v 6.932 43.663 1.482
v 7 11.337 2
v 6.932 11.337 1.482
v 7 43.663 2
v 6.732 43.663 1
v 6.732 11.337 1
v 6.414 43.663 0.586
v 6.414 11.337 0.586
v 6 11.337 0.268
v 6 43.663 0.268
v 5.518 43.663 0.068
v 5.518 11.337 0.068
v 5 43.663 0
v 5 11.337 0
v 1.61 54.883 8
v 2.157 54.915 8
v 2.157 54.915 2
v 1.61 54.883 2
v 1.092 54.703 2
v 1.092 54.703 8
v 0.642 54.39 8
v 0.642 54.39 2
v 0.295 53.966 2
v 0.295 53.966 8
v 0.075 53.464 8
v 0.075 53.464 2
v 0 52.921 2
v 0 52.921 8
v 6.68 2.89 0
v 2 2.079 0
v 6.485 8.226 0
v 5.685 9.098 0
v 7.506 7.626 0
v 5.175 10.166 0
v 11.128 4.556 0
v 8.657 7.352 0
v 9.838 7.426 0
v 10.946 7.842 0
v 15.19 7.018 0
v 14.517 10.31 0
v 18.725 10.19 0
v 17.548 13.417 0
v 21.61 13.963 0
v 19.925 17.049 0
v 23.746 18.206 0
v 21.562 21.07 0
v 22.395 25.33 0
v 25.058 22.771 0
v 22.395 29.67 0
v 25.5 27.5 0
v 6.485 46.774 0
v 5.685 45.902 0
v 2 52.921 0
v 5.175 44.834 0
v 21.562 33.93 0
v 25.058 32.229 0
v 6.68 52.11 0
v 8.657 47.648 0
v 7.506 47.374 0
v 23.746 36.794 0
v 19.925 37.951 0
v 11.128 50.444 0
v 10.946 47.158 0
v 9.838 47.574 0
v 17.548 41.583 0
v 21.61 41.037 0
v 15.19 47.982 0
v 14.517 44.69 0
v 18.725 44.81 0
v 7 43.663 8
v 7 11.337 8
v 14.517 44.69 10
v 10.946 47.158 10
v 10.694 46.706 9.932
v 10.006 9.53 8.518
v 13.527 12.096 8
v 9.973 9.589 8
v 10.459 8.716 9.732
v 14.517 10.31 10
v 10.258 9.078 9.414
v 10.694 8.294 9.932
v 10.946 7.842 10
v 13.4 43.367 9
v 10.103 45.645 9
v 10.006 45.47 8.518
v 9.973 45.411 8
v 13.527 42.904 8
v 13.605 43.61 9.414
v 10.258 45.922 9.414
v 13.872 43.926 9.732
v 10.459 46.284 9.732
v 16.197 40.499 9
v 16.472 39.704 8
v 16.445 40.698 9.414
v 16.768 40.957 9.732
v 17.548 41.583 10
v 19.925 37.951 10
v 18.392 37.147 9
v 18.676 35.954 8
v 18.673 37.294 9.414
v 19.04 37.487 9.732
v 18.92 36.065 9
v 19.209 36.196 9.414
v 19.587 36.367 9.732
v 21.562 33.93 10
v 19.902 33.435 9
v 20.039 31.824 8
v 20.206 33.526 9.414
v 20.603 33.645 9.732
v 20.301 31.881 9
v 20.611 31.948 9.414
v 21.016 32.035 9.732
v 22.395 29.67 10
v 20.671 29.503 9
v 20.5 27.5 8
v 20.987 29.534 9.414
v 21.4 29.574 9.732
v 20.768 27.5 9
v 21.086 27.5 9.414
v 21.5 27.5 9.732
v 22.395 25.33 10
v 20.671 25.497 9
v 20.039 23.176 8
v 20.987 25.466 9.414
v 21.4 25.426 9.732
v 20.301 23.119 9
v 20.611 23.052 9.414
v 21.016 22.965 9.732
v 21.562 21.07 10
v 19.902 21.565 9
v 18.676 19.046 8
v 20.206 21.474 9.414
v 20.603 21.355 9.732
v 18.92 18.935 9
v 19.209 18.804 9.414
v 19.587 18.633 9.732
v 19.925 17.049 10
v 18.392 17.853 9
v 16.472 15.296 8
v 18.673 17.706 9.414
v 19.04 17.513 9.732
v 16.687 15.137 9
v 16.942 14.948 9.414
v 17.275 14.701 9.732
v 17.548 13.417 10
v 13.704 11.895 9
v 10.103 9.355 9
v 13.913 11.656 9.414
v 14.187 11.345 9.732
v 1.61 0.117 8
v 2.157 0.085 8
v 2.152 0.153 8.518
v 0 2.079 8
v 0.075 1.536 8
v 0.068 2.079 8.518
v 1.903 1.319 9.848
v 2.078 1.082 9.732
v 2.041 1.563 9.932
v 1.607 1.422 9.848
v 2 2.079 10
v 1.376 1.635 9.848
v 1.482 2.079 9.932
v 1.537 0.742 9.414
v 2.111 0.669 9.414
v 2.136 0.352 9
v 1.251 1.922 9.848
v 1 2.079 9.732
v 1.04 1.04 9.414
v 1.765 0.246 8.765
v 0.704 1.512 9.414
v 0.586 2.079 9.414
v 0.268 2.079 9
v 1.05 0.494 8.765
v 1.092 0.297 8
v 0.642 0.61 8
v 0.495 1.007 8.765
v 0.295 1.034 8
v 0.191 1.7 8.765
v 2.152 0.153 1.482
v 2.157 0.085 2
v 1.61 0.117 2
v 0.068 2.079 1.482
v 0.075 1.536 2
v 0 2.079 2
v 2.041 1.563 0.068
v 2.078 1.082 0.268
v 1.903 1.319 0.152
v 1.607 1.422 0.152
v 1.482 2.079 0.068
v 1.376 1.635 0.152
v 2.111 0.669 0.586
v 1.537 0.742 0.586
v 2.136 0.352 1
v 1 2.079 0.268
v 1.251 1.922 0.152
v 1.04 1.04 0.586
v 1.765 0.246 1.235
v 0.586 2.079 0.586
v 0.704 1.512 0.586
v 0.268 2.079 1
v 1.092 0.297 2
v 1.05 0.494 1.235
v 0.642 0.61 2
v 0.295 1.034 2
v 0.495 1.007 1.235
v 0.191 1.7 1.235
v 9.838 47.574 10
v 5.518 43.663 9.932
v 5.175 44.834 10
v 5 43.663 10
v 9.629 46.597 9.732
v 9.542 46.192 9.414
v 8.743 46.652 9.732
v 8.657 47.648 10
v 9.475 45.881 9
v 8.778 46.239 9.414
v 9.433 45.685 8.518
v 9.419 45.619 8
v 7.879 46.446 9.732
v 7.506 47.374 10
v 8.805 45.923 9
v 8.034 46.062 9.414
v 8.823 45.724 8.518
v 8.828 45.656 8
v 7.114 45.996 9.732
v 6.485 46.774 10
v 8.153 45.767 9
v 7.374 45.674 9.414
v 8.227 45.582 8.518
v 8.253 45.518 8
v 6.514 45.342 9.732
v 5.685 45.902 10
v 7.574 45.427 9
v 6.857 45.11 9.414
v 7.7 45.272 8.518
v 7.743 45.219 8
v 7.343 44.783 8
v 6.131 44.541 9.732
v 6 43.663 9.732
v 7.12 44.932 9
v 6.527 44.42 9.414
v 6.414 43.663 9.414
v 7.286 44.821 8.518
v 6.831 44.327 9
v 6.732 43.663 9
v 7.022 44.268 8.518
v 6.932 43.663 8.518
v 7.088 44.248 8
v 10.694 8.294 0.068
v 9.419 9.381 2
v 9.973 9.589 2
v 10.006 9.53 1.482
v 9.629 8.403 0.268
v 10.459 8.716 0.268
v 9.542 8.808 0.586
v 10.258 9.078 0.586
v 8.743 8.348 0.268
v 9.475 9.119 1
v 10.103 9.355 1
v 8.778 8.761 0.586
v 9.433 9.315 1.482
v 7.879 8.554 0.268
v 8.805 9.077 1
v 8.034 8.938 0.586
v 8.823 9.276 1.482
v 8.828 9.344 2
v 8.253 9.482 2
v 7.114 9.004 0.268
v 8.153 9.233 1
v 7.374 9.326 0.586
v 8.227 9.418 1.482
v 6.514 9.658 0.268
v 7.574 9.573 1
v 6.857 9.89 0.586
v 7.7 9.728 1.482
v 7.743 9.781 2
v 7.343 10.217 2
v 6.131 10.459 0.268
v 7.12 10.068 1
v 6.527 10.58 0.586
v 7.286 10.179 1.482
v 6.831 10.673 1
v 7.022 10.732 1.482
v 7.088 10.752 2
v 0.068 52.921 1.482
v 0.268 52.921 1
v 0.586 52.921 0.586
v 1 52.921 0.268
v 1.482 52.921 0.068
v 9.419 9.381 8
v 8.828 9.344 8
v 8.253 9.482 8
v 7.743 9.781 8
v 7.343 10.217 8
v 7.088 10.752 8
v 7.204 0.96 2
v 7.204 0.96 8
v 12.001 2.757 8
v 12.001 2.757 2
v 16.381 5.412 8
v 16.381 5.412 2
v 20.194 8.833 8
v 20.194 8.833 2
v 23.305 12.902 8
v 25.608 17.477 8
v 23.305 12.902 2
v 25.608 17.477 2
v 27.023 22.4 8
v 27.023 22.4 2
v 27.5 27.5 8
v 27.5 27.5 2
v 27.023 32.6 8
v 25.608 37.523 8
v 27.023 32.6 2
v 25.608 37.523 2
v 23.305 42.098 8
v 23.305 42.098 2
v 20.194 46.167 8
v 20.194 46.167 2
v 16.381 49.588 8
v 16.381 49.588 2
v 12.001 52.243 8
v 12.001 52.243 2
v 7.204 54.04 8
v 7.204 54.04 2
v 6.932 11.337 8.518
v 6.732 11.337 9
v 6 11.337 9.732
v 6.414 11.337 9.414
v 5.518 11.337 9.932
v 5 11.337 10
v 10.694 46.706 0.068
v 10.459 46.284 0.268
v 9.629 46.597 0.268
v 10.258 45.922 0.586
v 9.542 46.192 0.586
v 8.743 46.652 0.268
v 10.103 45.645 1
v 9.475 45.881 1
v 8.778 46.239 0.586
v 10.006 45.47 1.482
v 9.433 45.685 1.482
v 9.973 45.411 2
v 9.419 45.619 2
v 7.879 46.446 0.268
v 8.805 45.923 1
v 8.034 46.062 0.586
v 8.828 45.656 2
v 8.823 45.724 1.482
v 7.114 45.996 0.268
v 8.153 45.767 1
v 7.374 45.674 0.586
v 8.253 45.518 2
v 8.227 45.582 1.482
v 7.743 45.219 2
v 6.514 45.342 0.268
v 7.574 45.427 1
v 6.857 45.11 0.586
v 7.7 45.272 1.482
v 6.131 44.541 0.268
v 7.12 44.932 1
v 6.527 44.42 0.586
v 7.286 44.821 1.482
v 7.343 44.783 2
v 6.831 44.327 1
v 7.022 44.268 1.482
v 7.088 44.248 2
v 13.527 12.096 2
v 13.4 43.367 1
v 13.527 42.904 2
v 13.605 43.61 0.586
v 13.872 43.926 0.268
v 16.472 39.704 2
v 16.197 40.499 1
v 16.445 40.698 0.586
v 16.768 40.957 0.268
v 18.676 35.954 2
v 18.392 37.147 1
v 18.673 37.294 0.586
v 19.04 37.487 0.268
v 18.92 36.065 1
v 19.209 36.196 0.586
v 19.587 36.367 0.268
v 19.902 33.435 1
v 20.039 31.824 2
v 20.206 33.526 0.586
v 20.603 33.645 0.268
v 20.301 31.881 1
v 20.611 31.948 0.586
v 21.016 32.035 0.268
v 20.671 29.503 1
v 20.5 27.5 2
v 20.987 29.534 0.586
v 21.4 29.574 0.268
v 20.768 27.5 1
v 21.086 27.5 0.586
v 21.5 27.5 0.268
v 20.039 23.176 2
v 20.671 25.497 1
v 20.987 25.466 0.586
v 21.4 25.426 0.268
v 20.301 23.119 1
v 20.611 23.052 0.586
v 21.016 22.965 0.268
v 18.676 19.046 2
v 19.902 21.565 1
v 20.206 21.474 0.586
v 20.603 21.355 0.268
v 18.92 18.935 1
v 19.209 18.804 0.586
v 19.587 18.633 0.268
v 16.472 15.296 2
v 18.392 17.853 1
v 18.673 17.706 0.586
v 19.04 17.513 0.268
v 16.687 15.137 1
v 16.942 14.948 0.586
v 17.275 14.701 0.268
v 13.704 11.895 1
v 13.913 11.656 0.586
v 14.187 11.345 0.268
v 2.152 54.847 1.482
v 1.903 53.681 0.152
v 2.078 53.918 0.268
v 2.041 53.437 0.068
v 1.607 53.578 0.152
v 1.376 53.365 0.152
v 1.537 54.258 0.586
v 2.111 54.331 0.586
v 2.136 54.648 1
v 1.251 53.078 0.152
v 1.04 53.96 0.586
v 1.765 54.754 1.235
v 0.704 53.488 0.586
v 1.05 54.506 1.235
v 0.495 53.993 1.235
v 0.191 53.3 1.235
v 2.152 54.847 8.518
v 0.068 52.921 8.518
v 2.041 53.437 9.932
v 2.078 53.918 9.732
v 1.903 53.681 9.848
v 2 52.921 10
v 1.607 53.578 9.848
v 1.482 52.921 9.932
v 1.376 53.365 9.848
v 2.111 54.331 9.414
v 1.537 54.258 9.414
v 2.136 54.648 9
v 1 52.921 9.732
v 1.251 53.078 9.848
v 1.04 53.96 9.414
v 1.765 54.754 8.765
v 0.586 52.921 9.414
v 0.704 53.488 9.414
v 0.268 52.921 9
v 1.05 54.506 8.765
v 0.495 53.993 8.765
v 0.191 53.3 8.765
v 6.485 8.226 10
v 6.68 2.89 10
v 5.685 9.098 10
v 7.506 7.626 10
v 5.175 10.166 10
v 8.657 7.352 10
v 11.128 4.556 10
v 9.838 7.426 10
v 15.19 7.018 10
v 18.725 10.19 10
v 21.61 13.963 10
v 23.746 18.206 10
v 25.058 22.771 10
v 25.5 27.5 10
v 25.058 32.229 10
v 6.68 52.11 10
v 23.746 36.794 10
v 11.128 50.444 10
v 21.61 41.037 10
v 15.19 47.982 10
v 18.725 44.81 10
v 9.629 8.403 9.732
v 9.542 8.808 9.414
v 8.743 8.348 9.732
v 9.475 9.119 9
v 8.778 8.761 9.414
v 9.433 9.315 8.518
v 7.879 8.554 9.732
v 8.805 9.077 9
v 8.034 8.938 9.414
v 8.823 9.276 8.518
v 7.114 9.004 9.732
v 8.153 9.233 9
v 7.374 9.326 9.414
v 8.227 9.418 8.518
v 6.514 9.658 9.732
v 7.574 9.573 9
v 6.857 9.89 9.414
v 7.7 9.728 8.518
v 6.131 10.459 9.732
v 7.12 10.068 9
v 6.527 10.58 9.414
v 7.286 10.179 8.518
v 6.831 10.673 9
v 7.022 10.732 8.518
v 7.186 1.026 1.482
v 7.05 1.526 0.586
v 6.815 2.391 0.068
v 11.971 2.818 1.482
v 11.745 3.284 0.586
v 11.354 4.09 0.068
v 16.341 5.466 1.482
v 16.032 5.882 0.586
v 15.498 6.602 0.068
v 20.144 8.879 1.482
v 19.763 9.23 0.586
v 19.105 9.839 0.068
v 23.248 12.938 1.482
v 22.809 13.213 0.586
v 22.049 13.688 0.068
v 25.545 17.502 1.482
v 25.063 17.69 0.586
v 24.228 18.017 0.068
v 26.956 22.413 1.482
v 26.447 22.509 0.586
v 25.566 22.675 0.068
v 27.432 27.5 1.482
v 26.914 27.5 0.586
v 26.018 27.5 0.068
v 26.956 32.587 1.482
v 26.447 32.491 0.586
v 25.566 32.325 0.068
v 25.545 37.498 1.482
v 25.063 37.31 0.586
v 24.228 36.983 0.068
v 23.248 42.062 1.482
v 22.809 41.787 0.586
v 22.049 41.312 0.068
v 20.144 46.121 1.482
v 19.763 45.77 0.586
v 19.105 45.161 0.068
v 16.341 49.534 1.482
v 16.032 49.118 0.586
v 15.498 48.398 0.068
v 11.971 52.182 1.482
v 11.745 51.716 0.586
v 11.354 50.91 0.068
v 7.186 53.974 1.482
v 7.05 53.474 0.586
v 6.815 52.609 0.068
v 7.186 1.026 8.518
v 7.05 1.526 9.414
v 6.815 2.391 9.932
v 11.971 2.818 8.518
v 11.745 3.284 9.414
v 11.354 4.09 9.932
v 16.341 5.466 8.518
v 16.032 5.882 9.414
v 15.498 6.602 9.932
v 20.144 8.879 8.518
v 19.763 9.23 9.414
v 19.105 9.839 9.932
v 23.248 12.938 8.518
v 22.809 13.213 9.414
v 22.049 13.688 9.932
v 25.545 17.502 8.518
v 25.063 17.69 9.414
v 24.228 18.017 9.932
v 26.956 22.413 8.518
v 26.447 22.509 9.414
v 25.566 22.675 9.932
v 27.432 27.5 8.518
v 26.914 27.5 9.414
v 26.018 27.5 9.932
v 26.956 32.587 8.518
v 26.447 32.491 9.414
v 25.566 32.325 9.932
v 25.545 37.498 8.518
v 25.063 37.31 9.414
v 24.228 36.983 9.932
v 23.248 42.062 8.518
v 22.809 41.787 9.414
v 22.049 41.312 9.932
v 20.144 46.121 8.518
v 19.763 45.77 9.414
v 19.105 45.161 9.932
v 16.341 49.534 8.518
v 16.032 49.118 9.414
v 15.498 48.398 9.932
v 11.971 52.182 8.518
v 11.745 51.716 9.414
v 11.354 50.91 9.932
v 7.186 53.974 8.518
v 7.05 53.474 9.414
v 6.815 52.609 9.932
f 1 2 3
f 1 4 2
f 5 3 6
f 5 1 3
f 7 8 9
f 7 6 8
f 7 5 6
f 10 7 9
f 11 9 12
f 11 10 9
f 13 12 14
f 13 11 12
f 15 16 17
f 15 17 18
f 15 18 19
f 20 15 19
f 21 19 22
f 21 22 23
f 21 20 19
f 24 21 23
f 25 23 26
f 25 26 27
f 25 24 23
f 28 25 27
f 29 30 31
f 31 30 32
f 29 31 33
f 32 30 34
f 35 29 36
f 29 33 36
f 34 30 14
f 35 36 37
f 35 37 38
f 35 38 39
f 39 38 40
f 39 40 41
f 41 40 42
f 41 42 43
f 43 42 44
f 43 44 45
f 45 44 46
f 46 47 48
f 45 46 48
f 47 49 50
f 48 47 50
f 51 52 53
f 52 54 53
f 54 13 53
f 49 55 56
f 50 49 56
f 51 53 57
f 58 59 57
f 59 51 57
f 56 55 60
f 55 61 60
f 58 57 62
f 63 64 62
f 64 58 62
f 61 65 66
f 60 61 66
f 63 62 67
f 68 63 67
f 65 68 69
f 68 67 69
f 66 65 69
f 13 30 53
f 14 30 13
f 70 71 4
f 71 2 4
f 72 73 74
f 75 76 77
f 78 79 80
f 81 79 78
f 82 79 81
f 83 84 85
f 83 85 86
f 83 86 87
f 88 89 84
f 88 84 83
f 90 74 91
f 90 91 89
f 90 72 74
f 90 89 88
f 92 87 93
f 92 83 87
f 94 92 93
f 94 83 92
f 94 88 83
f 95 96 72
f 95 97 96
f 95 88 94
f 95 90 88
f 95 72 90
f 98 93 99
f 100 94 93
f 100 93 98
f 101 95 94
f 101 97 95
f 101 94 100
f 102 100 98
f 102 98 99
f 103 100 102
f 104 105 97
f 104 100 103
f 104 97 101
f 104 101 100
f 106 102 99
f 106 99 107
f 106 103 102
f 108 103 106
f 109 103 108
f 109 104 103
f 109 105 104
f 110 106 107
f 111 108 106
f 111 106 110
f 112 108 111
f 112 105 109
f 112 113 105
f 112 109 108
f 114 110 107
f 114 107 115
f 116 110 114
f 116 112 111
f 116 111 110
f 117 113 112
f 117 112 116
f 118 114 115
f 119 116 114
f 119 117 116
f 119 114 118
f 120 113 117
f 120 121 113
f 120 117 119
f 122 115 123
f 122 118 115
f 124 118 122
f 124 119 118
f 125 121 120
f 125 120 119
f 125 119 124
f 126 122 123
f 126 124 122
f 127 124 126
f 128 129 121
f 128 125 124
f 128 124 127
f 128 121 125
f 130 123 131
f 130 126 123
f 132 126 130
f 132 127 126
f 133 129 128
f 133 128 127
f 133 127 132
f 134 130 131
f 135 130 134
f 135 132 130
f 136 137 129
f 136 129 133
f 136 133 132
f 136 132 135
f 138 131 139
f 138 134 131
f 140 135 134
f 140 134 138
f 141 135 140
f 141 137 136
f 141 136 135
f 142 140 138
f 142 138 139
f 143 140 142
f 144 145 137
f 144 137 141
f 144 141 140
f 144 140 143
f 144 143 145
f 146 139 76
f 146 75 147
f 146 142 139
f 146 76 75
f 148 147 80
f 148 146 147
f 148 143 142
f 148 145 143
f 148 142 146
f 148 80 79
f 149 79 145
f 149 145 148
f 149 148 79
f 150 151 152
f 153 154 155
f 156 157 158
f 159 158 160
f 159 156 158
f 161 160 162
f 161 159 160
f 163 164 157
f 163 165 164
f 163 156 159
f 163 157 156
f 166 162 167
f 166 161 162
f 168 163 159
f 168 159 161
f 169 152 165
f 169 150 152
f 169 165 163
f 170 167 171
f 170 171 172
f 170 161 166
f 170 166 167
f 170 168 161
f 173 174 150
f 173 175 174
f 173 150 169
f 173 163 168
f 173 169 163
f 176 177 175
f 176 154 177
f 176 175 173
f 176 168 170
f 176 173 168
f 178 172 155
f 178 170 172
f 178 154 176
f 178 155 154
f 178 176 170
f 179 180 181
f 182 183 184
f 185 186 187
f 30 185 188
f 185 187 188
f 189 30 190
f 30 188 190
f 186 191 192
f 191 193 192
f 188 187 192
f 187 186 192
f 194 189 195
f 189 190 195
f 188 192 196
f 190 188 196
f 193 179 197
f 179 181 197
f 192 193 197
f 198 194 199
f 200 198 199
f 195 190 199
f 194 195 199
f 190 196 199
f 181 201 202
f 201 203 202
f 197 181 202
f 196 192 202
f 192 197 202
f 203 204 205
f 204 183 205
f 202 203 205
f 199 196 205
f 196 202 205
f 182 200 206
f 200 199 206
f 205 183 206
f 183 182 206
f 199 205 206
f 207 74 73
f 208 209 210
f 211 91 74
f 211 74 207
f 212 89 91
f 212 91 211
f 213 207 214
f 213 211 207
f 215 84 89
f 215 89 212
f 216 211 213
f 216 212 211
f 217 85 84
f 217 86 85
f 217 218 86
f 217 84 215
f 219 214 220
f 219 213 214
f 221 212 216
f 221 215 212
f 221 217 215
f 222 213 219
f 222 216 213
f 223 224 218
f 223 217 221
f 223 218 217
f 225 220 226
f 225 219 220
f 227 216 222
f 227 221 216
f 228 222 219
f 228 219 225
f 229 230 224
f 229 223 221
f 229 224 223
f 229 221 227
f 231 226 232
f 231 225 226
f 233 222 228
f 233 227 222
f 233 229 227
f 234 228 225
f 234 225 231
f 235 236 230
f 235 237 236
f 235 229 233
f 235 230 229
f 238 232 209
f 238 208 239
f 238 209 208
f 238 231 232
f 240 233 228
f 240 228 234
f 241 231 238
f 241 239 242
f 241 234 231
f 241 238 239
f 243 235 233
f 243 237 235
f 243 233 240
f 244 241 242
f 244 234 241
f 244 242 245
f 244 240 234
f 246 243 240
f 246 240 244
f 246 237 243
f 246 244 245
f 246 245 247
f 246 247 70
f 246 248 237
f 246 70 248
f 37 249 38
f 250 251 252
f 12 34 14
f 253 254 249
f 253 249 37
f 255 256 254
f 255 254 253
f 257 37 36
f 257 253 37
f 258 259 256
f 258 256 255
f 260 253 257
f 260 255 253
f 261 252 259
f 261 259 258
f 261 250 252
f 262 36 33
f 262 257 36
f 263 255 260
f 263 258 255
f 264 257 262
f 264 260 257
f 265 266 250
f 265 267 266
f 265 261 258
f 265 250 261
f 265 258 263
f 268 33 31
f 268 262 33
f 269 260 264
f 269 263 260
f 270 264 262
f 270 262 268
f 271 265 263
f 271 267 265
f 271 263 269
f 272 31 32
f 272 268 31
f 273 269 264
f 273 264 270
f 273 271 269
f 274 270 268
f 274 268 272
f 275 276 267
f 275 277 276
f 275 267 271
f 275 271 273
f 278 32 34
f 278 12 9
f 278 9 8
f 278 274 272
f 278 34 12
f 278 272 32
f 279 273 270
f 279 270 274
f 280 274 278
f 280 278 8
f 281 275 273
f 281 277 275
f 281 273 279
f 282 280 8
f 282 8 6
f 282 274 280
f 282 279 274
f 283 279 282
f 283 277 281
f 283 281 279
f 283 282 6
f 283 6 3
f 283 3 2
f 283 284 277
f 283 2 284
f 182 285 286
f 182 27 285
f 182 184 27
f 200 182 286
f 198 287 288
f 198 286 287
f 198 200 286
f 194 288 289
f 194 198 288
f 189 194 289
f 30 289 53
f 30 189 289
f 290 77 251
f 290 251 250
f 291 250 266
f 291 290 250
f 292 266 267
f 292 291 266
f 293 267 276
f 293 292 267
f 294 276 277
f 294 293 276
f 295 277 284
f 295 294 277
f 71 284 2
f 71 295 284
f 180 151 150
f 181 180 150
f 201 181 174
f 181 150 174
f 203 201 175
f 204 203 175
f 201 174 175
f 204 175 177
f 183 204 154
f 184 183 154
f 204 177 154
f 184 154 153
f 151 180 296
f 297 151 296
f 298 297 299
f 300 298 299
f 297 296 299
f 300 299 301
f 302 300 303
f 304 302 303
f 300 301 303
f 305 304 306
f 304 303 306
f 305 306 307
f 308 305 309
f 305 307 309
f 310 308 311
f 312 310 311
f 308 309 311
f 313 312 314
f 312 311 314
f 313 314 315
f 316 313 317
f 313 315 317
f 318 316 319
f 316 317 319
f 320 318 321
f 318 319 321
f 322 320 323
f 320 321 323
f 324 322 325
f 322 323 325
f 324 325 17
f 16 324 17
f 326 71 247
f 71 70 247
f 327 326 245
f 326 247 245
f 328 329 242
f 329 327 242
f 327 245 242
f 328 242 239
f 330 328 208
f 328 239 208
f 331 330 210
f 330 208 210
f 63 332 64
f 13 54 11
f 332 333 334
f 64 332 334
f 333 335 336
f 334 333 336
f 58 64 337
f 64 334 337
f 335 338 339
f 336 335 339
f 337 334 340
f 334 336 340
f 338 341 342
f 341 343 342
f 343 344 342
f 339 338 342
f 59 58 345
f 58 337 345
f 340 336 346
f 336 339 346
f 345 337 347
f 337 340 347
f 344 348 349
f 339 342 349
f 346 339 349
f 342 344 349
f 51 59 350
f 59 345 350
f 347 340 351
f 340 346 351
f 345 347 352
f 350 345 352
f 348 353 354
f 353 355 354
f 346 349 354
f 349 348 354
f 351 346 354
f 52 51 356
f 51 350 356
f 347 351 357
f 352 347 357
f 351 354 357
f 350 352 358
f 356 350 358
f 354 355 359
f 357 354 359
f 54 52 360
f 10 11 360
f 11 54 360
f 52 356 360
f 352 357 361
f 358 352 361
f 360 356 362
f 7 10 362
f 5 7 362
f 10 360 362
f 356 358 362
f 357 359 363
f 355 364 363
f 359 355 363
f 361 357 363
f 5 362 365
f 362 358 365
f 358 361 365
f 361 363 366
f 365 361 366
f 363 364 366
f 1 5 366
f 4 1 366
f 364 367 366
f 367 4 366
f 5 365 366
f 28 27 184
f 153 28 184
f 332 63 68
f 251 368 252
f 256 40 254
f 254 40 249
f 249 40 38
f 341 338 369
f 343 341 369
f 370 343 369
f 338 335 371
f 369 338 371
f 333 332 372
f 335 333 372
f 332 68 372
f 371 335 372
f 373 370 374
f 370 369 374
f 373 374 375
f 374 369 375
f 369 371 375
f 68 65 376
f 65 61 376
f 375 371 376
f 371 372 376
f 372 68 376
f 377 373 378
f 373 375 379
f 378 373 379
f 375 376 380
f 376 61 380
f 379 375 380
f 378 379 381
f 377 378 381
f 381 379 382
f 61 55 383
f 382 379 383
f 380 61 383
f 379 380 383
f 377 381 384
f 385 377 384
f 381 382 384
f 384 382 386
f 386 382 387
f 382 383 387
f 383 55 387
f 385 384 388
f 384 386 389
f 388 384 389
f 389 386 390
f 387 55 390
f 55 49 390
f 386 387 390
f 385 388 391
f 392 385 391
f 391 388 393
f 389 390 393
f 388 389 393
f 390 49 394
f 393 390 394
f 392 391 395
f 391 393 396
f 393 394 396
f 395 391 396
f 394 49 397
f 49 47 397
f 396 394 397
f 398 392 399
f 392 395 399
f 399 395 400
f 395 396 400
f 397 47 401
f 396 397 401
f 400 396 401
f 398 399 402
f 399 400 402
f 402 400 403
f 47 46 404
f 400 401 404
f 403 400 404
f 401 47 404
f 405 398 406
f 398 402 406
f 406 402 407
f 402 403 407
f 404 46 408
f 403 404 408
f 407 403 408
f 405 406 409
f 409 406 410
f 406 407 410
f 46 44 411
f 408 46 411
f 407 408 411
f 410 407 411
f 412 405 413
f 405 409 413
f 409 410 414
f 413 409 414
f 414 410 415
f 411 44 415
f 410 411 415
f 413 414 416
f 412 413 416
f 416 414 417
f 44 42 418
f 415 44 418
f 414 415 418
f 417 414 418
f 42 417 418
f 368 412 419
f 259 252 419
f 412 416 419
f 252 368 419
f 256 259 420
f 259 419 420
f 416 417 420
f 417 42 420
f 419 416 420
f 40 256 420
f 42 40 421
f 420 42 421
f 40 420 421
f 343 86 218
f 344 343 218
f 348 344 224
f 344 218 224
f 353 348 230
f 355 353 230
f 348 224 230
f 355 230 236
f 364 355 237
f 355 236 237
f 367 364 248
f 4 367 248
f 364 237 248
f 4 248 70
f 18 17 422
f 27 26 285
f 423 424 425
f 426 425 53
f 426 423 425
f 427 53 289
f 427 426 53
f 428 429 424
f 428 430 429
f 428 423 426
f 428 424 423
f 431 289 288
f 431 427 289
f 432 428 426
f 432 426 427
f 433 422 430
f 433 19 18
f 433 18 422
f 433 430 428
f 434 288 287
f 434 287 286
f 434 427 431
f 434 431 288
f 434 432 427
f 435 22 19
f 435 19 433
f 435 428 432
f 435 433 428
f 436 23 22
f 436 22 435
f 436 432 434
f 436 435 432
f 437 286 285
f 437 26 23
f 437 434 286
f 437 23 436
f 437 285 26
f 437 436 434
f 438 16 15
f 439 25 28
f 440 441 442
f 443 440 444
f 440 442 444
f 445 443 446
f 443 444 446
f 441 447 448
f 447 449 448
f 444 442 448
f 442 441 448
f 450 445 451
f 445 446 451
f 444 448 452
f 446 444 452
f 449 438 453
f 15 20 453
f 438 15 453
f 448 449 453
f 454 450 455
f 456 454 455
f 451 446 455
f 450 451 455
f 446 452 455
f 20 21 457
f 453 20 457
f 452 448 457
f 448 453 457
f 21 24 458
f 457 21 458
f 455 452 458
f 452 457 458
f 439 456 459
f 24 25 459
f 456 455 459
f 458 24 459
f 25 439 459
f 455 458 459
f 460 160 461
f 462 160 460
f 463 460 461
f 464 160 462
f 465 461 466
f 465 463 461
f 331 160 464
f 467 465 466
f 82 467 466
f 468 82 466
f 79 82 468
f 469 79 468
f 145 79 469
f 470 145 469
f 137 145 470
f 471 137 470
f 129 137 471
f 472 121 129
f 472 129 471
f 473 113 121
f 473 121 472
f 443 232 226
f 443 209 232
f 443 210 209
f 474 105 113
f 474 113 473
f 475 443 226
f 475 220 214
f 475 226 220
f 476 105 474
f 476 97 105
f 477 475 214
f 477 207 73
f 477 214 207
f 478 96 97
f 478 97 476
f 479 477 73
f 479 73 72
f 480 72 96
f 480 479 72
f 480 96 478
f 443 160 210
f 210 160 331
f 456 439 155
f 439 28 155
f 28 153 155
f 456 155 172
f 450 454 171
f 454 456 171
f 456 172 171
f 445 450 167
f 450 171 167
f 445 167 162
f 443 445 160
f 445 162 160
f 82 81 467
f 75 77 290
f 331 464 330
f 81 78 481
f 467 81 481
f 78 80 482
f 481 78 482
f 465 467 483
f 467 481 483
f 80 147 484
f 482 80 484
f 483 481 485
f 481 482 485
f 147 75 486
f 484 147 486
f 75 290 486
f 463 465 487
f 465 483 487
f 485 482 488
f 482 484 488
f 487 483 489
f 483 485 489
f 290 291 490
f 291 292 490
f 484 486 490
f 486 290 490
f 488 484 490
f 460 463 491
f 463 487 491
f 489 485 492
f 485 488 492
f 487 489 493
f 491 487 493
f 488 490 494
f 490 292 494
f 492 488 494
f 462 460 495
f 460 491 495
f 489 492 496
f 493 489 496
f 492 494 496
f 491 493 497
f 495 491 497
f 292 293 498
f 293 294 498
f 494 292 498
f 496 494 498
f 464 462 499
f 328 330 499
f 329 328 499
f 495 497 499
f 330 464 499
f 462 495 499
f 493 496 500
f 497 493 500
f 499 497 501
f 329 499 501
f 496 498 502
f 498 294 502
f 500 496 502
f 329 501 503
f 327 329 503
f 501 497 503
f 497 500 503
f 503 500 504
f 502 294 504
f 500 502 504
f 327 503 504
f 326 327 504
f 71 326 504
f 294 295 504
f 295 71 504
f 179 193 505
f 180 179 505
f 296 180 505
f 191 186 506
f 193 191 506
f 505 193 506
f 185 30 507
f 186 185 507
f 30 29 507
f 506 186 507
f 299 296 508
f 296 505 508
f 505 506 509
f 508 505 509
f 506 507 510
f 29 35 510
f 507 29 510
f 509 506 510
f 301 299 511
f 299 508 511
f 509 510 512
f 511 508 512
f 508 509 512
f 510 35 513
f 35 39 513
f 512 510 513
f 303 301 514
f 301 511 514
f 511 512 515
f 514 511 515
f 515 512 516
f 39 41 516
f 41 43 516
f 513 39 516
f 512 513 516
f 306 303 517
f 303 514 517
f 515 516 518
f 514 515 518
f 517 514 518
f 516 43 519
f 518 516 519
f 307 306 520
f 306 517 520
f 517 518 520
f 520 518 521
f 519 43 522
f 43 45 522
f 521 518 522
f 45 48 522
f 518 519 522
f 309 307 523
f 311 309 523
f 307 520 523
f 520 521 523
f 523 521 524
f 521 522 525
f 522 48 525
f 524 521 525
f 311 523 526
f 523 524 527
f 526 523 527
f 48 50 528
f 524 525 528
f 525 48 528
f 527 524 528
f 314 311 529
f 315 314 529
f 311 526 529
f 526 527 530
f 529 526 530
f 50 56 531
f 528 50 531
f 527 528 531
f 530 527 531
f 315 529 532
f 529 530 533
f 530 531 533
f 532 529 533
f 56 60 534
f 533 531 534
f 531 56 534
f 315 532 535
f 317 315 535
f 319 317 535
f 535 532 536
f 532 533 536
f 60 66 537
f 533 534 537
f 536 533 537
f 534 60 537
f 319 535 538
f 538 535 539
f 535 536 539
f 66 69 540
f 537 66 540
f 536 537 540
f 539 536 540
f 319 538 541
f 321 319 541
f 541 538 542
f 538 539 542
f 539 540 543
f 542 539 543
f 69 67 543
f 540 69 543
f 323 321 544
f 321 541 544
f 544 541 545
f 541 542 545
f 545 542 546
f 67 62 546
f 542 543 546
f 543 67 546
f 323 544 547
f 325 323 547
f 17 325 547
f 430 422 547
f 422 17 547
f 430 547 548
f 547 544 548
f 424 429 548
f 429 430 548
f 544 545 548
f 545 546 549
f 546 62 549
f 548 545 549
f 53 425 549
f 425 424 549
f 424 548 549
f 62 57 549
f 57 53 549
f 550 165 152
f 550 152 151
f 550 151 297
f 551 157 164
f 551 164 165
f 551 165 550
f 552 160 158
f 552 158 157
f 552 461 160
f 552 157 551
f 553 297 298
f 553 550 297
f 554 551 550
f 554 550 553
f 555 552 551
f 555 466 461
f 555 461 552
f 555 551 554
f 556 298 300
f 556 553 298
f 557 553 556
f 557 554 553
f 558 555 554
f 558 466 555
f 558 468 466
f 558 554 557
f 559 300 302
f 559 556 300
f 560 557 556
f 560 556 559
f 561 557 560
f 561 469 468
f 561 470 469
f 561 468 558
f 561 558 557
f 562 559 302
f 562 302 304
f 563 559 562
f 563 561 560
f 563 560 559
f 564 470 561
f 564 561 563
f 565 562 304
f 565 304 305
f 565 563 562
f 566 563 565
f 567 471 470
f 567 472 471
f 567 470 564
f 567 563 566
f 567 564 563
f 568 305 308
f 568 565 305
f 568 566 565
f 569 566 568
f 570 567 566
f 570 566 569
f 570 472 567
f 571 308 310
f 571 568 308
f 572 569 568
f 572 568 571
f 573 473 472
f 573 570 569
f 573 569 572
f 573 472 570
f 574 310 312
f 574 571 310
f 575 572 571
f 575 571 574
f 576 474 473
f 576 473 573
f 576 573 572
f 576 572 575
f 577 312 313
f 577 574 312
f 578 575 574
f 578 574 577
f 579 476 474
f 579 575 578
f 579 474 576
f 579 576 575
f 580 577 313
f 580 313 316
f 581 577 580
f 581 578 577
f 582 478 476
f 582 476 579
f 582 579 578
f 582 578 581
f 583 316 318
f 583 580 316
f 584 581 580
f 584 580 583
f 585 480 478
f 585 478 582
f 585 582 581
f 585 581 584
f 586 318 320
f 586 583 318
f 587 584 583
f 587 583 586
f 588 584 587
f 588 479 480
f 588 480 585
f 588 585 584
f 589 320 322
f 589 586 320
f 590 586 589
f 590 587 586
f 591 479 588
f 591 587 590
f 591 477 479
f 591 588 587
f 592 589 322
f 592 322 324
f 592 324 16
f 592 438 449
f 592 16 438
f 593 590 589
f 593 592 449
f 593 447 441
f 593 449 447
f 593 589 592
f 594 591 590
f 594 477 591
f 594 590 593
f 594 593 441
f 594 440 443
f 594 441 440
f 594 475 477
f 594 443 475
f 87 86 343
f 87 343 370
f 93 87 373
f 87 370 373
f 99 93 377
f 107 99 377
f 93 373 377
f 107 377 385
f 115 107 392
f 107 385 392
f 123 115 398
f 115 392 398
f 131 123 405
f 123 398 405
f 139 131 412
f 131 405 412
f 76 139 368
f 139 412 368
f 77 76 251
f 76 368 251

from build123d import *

# Parameters (mm, degrees)
F1_DEPTH = 10
F2_R     = 2


with BuildPart() as f1:
    # F0 (on Top) → F1 (new body)
    with BuildSketch(Plane.XY):
        with BuildLine():
            Line((0, 7), (0, 0))
            ThreePointArc((0, 0), (27.5, 27.5), (0, 55))
            Line((0, 55), (0, 48))
            ThreePointArc((0, 48), (3.553808, 47.689612), (7, 46.767849))
            ThreePointArc((7, 46.767849), (20.5, 27.5), (7, 8.232151))
            ThreePointArc((7, 8.232151), (3.553808, 7.310388), (0, 7))
        make_face()
        with BuildLine():
            Line((0, 27.5), (0, 7))
            ThreePointArc((0, 7), (3.553808, 7.310388), (7, 8.232151))
            Line((7, 8.232151), (7, 27.5))
            Line((7, 27.5), (0, 27.5))
        make_face()
        with BuildLine():
            Line((0, 48), (0, 27.5))
            Line((0, 27.5), (7, 27.5))
            Line((7, 27.5), (7, 46.767849))
            ThreePointArc((7, 46.767849), (3.553808, 47.689612), (0, 48))
        make_face()
    extrude(amount=F1_DEPTH)

    # F2
    f2_edges = [f1.edges().sort_by_distance(p)[0] for p in [
        (0, 0, 5),
        (0, 55, 5),
        (27.5, 27.5, 0),
        (27.5, 27.5, 10),
        (20.5, 27.5, 10),
        (7, 27.5, 10),
        (0, 27.5, 10),
        (20.5, 27.5, 0),
        (0, 27.5, 0),
        (7, 27.5, 0),
        (7, 8.232151, 5),
        (7, 46.767849, 5),
    ]]
    fillet(f2_edges, radius=F2_R)


solid = f1.part
